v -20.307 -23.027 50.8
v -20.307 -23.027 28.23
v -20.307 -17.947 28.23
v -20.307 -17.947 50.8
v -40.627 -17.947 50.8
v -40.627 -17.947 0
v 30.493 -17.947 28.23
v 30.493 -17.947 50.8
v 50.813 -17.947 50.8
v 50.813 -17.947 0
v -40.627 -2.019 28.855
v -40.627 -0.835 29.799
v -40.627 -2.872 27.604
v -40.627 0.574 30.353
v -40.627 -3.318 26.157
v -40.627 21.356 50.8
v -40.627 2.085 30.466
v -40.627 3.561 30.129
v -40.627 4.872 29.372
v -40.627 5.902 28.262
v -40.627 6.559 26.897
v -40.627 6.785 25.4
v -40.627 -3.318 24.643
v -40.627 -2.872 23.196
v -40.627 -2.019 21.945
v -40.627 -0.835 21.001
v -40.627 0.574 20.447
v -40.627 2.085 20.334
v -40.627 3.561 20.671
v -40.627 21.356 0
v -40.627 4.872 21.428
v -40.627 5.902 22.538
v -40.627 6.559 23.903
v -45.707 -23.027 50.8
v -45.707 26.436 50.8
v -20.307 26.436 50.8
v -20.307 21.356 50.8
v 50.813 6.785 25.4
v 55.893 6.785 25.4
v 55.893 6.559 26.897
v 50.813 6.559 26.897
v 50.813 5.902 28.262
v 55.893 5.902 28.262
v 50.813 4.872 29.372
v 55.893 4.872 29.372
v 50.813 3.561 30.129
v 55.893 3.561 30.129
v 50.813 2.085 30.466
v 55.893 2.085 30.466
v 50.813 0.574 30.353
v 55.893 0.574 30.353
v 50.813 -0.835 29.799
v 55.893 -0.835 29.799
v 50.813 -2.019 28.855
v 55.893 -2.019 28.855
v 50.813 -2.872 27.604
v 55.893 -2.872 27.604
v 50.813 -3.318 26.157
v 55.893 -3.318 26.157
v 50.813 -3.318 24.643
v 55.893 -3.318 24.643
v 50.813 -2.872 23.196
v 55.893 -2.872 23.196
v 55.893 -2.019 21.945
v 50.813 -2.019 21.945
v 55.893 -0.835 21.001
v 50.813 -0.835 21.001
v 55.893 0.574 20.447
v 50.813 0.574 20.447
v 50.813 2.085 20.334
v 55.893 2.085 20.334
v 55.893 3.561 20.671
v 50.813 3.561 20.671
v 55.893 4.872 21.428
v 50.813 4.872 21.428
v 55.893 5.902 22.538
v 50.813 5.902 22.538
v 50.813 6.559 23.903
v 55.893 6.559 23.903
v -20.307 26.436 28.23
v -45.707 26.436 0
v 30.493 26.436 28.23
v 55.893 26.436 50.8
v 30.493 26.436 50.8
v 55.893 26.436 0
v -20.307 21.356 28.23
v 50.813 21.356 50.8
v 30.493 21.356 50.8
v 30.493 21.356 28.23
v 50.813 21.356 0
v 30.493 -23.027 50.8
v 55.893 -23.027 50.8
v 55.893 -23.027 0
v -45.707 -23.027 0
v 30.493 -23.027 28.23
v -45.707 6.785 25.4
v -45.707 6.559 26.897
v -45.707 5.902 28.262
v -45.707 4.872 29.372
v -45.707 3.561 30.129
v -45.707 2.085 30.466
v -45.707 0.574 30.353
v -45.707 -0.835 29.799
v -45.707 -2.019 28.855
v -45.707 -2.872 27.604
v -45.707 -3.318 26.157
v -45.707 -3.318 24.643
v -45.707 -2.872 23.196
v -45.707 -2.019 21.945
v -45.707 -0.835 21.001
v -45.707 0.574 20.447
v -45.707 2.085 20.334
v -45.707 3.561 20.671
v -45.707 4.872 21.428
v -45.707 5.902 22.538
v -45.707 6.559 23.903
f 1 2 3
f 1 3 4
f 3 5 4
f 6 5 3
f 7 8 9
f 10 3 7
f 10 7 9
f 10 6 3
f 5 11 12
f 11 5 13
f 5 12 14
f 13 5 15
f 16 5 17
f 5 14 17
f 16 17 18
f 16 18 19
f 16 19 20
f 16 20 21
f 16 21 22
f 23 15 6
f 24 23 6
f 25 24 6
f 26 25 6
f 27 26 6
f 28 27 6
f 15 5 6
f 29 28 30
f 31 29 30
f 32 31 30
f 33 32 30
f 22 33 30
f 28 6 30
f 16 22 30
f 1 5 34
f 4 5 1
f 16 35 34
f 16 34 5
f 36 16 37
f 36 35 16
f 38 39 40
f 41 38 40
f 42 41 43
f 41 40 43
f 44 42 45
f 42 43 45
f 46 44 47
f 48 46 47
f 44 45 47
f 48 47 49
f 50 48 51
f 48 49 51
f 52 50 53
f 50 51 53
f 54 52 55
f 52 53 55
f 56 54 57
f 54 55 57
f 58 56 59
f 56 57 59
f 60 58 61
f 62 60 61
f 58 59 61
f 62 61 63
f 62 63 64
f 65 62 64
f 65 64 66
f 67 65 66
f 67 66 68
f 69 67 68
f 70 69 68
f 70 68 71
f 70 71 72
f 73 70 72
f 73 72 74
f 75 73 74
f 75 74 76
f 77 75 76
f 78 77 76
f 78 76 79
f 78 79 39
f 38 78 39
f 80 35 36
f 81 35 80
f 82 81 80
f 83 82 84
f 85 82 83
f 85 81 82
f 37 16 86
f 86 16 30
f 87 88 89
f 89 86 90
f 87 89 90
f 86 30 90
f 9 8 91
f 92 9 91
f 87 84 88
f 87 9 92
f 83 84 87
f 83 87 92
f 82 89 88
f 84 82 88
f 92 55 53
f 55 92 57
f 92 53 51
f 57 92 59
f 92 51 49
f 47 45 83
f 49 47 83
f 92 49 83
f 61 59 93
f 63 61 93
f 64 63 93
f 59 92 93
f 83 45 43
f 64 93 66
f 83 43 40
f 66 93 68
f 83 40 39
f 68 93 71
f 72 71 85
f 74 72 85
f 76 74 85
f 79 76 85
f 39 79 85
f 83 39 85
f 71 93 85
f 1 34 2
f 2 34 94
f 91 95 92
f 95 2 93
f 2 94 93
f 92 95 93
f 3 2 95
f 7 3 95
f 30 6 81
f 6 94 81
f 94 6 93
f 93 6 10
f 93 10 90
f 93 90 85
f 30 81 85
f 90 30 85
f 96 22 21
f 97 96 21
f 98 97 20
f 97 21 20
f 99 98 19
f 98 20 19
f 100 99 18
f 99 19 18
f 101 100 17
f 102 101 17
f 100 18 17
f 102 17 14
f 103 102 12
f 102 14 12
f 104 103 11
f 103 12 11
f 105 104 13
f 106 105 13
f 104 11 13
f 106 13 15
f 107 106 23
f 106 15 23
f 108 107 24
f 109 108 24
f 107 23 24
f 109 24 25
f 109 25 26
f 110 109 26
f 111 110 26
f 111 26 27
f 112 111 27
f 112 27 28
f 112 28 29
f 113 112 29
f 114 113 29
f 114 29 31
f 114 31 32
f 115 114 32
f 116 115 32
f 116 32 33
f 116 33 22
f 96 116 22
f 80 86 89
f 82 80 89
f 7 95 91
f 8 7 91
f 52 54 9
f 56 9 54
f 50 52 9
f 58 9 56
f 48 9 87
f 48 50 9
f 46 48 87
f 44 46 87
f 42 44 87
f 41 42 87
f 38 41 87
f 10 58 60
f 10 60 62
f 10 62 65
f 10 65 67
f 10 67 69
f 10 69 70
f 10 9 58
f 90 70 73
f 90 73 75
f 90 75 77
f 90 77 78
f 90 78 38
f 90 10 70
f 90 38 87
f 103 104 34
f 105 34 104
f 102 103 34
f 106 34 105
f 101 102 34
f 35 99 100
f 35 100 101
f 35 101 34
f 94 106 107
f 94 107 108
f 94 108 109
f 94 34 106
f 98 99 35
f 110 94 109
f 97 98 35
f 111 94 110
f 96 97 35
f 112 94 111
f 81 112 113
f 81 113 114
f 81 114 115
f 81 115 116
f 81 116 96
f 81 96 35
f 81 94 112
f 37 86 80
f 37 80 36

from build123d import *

# Parameters (mm, degrees)
F0_W     = 101.6
F0_H     = 49.463168
F0_W_2   = 91.44
F0_H_2   = 39.303168
F1_DEPTH = 50.8
F2_R     = 5.08
F3_DEPTH = 114.3
F4_W     = 50.8
F4_H     = 22.569782
F5_DEPTH = 63.5


with BuildPart() as f1:
    # F0 (on Top) → F1 (new body)
    with BuildSketch(Plane.XY):
        with Locations((5.092576, 1.704902)):
            Rectangle(F0_W, F0_H)
        with Locations((5.092576, 1.704902)):
            Rectangle(F0_W_2, F0_H_2, mode=Mode.SUBTRACT)
    extrude(amount=F1_DEPTH)

    # F2 (on face) → F3 (cut)
    with BuildSketch(Plane.YZ.offset(55.892576)):
        with Locations((1.704902, 25.4)):
            Circle(F2_R)
    extrude(amount=-F3_DEPTH, mode=Mode.SUBTRACT)

    # F4 (on face) → F5 (cut)
    with BuildSketch(Plane.XZ.offset(23.026682)):
        with Locations((5.092576, 39.515109)):
            Rectangle(F4_W, F4_H)
    extrude(amount=-F5_DEPTH, mode=Mode.SUBTRACT)


solid = f1.part
